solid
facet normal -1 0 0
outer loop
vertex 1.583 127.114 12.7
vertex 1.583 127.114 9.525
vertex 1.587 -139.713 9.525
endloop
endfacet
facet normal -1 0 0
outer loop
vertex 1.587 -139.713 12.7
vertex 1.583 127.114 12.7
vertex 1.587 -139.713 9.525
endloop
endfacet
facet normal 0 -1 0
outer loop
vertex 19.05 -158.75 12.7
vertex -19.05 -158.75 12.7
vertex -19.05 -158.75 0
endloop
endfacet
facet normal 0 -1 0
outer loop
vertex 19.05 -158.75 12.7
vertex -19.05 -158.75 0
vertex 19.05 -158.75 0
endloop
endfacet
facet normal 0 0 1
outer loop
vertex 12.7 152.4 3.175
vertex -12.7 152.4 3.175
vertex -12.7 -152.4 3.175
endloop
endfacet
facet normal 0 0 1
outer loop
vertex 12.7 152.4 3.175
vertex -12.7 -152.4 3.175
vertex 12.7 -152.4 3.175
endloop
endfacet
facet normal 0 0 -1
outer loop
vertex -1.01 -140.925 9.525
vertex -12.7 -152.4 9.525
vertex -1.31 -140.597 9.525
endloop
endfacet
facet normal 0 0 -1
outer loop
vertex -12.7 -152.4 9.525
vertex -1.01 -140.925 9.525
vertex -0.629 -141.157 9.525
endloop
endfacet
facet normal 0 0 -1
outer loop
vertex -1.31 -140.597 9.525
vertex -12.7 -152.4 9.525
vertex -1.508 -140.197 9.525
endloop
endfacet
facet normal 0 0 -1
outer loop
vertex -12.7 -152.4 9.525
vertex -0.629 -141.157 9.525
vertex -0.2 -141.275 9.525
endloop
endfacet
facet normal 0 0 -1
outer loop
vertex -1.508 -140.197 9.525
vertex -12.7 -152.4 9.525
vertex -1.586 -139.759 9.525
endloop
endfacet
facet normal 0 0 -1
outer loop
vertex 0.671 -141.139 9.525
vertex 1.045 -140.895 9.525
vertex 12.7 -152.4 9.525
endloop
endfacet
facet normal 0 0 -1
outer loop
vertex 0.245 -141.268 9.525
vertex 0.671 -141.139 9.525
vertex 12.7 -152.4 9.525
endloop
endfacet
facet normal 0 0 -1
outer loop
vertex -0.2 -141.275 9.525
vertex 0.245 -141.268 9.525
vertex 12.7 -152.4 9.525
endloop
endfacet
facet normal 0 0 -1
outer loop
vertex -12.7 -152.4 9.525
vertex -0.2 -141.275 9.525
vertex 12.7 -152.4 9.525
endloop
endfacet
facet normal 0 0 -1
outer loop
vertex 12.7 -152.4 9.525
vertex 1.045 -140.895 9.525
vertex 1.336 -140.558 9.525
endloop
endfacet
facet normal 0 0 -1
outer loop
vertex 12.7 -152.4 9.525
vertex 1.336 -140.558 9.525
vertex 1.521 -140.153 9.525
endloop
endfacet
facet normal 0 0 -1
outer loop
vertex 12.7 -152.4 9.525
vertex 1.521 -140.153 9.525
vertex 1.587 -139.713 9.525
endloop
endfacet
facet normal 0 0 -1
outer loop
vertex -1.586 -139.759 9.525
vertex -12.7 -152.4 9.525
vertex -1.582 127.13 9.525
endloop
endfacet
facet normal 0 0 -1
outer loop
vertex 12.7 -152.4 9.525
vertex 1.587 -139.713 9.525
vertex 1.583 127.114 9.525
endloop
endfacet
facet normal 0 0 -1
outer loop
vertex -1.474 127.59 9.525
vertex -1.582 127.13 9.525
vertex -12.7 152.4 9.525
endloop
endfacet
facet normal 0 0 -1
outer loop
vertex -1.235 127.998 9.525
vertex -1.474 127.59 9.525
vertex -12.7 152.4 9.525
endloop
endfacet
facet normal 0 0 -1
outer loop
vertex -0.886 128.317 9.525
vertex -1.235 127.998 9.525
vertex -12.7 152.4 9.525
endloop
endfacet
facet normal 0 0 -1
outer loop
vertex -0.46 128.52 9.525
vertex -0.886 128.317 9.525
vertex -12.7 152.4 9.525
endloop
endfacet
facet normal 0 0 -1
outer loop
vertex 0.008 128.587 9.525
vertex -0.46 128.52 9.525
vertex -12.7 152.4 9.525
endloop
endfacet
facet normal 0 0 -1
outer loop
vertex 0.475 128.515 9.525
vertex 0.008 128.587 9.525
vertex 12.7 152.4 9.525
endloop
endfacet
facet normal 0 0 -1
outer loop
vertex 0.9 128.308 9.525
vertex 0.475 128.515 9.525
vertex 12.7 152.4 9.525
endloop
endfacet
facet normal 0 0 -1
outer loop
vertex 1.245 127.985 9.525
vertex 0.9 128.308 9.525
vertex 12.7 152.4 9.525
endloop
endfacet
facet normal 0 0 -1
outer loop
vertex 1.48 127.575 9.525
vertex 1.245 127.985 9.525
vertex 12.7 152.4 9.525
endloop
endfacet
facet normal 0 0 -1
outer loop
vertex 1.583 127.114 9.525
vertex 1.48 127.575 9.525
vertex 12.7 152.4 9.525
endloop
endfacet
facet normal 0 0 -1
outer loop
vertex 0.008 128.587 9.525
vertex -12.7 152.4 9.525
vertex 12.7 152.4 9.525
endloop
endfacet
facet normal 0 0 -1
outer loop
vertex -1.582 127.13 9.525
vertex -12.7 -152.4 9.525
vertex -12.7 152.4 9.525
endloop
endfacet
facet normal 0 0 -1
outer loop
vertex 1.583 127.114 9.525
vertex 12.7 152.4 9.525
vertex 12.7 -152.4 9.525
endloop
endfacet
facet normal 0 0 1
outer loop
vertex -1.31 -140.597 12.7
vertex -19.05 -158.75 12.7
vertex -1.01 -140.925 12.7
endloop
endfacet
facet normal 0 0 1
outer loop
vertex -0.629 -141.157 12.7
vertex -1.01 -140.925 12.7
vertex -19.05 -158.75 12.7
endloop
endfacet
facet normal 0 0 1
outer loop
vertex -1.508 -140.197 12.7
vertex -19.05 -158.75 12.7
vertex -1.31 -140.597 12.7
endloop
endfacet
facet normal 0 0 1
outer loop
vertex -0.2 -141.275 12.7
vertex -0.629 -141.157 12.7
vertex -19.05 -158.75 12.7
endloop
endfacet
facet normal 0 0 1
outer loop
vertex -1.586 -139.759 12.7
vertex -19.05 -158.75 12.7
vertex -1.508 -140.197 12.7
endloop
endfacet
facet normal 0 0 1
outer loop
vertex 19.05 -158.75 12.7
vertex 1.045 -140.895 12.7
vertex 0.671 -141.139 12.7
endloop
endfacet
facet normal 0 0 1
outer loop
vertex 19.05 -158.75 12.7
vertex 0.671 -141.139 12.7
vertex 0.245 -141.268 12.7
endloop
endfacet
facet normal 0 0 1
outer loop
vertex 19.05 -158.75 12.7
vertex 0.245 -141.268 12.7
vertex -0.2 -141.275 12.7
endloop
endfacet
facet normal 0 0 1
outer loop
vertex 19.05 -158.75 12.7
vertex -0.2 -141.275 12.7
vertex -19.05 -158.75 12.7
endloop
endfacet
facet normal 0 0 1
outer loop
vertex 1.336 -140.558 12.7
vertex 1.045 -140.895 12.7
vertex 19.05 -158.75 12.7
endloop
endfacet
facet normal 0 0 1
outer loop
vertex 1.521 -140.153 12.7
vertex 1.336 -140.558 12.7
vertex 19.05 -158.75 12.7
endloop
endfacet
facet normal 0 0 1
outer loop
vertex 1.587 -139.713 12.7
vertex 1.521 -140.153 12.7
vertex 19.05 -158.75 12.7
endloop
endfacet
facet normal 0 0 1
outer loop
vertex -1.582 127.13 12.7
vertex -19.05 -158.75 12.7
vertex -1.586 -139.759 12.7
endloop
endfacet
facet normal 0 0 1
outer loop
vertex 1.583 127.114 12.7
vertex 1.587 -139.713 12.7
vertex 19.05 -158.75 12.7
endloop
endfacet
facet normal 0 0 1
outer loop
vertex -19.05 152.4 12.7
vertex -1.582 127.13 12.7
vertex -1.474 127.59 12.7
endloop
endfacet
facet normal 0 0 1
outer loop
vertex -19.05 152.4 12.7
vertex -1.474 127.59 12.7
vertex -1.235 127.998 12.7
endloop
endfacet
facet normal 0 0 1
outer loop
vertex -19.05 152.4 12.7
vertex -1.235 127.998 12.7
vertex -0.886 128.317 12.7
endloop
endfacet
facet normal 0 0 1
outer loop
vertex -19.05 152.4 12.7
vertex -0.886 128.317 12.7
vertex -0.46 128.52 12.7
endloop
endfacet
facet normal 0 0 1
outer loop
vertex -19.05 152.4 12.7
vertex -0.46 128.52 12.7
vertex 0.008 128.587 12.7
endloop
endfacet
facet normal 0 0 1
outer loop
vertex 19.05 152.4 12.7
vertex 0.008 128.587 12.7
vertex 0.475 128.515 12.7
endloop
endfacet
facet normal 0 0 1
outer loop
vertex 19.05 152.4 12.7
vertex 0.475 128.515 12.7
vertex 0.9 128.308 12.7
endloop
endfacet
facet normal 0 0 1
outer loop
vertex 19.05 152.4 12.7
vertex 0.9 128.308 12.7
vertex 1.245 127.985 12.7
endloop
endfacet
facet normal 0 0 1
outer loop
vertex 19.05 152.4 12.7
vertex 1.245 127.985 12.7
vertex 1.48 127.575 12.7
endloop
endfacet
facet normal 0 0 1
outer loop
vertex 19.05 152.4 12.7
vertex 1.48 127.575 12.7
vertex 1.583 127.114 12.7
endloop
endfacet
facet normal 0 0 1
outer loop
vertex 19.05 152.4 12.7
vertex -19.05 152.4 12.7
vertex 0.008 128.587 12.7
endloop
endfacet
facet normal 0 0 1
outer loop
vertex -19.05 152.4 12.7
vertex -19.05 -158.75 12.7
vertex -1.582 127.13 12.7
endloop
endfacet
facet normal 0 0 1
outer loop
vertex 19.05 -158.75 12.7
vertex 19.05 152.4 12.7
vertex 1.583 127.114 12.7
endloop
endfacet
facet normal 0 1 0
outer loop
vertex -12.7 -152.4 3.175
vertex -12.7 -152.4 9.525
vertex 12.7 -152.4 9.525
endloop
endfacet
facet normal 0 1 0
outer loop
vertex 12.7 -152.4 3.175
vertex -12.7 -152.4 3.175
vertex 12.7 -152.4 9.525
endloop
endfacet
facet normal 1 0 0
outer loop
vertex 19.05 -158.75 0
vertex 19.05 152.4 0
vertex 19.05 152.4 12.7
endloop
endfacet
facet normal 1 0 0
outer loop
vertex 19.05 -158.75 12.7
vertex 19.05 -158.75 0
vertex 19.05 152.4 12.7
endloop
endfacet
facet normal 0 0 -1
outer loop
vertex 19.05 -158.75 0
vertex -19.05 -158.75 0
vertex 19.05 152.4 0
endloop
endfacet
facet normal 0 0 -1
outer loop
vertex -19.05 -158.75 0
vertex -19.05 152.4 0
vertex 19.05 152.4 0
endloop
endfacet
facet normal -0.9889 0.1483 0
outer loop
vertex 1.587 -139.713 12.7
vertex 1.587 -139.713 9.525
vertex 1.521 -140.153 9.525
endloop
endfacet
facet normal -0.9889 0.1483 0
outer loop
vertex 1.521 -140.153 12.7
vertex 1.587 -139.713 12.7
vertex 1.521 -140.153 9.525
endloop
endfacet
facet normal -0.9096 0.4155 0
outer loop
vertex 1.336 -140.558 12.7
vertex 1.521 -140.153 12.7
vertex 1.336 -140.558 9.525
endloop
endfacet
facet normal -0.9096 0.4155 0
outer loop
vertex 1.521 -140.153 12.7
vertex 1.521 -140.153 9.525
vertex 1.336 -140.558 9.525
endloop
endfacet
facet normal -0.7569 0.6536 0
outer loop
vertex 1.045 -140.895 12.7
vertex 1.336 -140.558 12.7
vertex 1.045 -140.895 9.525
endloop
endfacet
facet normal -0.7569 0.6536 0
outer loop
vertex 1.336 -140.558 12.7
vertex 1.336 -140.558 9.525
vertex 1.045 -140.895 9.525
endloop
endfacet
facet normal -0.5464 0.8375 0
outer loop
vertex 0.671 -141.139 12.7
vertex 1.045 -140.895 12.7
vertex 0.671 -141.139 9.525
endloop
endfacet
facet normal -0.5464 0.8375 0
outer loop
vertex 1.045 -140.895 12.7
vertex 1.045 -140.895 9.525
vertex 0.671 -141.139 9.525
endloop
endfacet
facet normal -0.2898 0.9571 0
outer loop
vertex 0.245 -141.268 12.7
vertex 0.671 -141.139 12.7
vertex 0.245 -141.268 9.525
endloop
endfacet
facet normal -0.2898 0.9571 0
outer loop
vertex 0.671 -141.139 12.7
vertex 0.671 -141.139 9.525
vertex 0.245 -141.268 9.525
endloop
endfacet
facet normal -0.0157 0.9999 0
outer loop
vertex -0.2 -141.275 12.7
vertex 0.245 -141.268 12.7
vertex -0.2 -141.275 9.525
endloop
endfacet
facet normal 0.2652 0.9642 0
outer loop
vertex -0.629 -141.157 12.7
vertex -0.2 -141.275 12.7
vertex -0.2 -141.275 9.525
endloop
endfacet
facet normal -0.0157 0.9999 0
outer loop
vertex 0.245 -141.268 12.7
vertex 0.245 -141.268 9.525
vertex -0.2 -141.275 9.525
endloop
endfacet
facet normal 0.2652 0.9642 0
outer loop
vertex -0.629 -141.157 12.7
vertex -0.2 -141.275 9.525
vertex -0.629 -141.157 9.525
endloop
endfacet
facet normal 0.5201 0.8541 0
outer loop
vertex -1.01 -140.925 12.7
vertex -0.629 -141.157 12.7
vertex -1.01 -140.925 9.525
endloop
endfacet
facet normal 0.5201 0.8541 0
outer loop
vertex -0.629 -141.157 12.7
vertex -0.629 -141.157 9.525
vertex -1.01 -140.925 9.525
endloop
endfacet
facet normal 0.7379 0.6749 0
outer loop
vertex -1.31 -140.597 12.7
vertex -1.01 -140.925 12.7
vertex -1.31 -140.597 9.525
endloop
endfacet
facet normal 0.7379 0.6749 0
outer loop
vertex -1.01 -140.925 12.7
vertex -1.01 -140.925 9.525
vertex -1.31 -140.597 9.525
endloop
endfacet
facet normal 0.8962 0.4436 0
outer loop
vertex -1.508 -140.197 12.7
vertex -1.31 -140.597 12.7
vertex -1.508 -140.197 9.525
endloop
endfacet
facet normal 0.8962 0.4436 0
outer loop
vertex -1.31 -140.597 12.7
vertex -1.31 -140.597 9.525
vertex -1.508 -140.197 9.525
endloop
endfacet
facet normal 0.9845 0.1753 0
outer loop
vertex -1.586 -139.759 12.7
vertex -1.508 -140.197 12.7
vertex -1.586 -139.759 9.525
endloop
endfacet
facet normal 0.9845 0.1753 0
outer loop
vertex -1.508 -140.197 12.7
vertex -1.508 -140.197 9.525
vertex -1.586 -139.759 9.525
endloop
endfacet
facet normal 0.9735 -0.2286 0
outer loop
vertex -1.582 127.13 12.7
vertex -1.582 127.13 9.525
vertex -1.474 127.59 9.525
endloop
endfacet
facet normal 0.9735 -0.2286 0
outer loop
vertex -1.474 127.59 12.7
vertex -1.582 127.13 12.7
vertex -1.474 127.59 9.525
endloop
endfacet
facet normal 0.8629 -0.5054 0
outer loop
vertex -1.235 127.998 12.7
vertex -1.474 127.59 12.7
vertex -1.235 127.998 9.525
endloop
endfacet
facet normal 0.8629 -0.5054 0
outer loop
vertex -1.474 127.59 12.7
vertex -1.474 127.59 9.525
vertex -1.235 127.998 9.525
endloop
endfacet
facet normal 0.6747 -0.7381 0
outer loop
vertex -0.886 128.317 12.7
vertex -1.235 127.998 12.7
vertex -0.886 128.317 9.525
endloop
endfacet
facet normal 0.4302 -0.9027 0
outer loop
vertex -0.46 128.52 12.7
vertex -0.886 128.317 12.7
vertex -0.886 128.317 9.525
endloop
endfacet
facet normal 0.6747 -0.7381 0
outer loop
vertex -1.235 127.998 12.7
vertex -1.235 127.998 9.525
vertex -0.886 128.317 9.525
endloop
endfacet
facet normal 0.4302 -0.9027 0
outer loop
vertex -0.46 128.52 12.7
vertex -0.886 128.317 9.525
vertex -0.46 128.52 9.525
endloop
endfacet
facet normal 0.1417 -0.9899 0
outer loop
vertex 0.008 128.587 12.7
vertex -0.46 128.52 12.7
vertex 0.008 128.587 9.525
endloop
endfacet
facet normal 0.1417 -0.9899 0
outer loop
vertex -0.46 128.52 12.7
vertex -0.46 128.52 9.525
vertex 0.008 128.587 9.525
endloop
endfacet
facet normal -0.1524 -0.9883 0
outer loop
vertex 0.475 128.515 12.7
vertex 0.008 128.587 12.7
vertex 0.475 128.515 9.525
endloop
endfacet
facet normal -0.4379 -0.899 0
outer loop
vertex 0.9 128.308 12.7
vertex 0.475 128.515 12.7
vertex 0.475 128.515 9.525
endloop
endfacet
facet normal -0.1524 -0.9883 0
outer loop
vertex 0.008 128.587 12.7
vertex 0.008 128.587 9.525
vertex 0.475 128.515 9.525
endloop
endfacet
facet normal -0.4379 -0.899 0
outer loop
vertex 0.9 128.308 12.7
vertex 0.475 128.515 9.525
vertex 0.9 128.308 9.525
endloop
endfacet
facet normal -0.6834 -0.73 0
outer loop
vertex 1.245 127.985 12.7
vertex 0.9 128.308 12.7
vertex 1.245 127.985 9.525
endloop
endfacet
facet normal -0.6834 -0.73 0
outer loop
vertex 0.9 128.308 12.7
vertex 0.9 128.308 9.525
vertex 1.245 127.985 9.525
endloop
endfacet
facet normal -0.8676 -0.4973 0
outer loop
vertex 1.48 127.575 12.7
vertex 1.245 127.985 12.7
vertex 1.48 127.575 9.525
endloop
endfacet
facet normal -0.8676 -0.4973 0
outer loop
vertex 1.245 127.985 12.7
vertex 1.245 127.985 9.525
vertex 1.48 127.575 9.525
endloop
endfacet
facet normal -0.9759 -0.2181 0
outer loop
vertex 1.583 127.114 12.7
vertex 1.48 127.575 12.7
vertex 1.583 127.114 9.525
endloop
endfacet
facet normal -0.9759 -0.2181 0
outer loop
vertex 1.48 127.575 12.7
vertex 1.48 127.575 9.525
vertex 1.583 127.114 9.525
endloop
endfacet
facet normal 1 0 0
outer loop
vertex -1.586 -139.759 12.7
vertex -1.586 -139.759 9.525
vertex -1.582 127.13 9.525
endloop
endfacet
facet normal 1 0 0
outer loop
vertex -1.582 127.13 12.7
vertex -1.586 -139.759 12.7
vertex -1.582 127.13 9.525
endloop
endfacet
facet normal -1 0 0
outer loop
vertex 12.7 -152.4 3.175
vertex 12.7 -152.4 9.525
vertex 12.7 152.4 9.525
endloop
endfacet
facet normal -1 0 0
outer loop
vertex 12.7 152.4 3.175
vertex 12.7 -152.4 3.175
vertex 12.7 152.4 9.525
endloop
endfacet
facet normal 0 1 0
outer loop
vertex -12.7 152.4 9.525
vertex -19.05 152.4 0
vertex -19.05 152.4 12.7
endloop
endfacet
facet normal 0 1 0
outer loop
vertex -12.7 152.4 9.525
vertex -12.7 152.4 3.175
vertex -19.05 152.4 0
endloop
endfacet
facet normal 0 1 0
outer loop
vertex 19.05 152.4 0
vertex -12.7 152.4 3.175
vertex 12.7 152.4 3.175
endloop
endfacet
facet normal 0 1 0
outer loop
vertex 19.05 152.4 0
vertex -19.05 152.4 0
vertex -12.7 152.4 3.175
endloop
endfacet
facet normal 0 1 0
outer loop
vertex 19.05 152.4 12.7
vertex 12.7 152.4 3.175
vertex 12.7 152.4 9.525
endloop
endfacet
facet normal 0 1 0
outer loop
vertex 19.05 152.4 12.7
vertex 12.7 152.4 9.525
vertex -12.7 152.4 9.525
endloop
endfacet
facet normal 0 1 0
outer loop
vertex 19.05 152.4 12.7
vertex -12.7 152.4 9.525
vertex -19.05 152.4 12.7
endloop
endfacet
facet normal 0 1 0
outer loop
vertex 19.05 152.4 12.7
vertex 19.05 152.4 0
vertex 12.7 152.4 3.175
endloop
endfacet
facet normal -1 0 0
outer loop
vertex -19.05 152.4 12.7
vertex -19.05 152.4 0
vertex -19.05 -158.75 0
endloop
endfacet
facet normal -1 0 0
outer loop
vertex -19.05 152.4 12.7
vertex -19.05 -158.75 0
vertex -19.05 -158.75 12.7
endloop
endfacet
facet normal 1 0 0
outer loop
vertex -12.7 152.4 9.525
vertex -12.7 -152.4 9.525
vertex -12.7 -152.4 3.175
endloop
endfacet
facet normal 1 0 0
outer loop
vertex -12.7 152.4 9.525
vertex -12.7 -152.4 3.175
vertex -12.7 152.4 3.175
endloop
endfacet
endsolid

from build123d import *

# Parameters (mm, degrees)
F0_W     = 38.1
F0_H     = 304.8
F1_DEPTH = 3.175
F3_START = 12.7
F2_W     = 304.8
F2_H     = 9.525
F3_DEPTH = 6.35
F4_START = -12.7
F4_DEPTH = 6.35
F6_START = 152.4
F5_W     = 38.1
F5_H     = 12.7
F6_DEPTH = 6.35
F8_START = 9.525
F7_W     = 38.1
F7_H     = 311.15
F8_DEPTH = 3.175


with BuildPart() as f1:
    # F0 (on Top) → F1 (new body)
    with BuildSketch(Plane.XY):
        Rectangle(F0_W, F0_H)
    extrude(amount=F1_DEPTH)

    # F2 (on Right) → F3 (join)
    with BuildSketch(Plane.YZ.offset(F3_START)):
        with Locations((0, 7.9375)):
            Rectangle(F2_W, F2_H)
    extrude(amount=F3_DEPTH)

    # F2 (on Right) → F4 (join)
    with BuildSketch(Plane.YZ.offset(F4_START)):
        with Locations((0, 7.9375)):
            Rectangle(F2_W, F2_H)
    extrude(amount=-F4_DEPTH)

    # F5 (on Front) → F6 (join)
    with BuildSketch(Plane.XZ.offset(F6_START)):
        with Locations((0, 6.35)):
            Rectangle(F5_W, F5_H)
    extrude(amount=F6_DEPTH)

    # F7 (on Top) → F8 (join)
    with BuildSketch(Plane.XY.offset(F8_START)):
        with Locations((0, -3.175)):
            Rectangle(F7_W, F7_H)
        with BuildLine():
            Line((1.5834027278, 127.1139826809), (1.5874468984, -139.7129844058))
            ThreePointArc((1.5874468984, -139.7129844058), (0.0230261009, -141.2873329987), (-1.5864023222, -139.7590247593))
            Line((-1.5864023222, -139.7590247593), (-1.5821546863, 127.1301645063))
            ThreePointArc((-1.5821546863, 127.1301645063), (0.0081149412, 128.587479259), (1.5834027278, 127.1139826809))
        make_face(mode=Mode.SUBTRACT)
    extrude(amount=F8_DEPTH)


solid = f1.part
